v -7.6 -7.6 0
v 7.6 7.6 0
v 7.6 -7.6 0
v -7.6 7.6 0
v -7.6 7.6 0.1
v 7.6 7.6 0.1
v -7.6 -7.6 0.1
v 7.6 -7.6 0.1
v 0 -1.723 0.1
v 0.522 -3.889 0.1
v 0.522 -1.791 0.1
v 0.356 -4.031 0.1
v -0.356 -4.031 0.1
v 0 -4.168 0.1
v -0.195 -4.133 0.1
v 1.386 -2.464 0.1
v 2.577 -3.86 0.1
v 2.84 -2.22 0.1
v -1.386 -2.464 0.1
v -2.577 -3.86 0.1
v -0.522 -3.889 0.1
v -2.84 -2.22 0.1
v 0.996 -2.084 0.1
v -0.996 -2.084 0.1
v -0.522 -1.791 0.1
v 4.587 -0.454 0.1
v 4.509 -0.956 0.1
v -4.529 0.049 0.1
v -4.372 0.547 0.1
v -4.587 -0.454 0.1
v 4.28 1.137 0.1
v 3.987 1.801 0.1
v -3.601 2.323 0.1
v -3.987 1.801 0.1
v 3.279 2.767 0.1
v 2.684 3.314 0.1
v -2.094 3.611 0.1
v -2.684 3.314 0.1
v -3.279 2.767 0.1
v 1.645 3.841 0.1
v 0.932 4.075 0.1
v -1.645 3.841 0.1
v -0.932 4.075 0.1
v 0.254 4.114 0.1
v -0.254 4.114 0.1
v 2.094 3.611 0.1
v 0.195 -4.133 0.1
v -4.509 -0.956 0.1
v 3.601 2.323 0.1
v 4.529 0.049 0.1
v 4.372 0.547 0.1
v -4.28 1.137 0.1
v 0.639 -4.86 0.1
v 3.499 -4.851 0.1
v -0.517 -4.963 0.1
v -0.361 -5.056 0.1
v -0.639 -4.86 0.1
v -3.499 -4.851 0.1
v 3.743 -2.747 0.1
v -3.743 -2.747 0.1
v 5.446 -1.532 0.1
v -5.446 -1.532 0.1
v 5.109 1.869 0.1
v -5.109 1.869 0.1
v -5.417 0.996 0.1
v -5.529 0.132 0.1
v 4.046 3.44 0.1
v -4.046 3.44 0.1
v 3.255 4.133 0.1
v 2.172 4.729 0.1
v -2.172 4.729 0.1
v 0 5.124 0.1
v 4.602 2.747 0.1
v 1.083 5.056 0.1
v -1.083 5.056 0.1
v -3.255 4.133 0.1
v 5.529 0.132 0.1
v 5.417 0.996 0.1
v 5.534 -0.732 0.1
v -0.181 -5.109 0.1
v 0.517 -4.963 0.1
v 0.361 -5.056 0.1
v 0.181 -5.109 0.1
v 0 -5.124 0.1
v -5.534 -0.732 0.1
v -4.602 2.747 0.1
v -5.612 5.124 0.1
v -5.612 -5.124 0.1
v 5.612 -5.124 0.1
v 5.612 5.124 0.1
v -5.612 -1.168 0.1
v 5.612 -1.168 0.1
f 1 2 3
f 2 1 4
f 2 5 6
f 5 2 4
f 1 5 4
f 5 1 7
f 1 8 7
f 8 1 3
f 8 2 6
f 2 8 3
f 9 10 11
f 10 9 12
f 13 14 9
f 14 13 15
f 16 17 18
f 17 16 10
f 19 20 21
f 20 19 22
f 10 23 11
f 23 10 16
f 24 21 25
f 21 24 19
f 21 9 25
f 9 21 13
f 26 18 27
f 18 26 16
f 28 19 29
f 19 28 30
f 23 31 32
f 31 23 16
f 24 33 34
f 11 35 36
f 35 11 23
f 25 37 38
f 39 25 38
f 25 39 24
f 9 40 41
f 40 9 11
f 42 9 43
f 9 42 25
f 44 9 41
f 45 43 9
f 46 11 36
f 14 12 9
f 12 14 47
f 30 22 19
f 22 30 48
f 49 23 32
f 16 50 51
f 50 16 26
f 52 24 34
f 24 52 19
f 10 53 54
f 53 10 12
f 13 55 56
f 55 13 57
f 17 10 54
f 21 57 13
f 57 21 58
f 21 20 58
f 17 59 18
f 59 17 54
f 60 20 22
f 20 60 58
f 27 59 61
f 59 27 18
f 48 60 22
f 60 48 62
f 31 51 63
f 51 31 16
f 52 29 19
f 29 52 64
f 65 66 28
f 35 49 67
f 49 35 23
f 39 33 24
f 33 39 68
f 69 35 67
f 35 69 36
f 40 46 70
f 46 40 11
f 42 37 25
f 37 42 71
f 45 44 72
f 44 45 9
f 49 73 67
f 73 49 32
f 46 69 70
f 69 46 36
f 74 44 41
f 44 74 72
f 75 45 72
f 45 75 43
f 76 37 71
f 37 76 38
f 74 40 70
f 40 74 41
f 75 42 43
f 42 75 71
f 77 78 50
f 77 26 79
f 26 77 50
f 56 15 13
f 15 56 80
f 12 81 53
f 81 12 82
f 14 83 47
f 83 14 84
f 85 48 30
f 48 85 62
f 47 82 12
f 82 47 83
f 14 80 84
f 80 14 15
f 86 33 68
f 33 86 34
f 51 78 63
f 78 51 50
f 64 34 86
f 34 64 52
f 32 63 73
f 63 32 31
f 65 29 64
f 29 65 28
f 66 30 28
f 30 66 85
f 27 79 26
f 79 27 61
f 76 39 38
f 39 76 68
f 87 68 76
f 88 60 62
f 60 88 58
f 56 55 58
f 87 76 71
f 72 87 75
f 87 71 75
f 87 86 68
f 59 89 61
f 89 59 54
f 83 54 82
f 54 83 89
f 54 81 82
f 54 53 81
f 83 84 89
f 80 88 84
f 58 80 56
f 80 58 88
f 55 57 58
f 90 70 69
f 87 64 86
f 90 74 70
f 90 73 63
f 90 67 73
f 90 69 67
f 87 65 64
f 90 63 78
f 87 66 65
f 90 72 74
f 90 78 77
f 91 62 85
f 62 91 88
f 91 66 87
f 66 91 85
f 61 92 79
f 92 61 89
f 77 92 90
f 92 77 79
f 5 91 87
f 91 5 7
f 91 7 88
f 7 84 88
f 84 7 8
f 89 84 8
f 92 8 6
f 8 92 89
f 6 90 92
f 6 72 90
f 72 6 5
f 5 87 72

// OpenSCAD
// file: ../p/logo-shell-1971-outerbox.scad
use <../lib.scad>
function ldraw_lib__logo_shell_1971_outerbox() = [
// 0 Logo Shell 1971 Outerbox
// 0 Name: logo-shell-1971-outerbox.dat
// 0 Author: Vincent Messenet [Cheenzo]
// 0 !LDRAW_ORG Primitive UPDATE 2023-04
// 0 !LICENSE Licensed under CC BY 4.0 : see CAreadme.txt
// 
// 0 BFC CERTIFY CCW
  [0,"BFC","CERTIFY"],
  [0,"BFC","CCW"],
// 
// 0 !HISTORY 2023-06-28 [Cheenzo] Created based on 3004s60 by J. C. Tchang [tchang]
// 0 !HISTORY 2023-08-25 [OrionP] Official Update 2023-04
// 
// 
// 0 // Shell Logo 1971
// 0 // Size: x = -11.5 to 11.5 y = -10.5 to 10.5 z = 0
// 
// 3 16 -11.5 0 10.5 -8.29 0 7.05 -6.67 0 8.47
  [3,16,-11.5,0,10.5,-8.29,0,7.05,-6.67,0,8.47],
// 4 16 -7.17 0 -9.94 -7.67 0 -5.63 -11.16 0 -3.14 -11.5 0 -10.5
  [4,16,-7.17,0,-9.94,-7.67,0,-5.63,-11.16,0,-3.14,-11.5,0,-10.5],
// 3 16 -.74 0 -10.36 -1.06 0 -10.17 -7.17 0 -9.94
  [3,16,-.74,0,-10.36,-1.06,0,-10.17,-7.17,0,-9.94],
// 3 16 -11.5 0 10.5 -6.67 0 8.47 -4.45 0 9.69
  [3,16,-11.5,0,10.5,-6.67,0,8.47,-4.45,0,9.69],
// 3 16 0 0 10.5 -11.5 0 10.5 -2.22 0 10.36
  [3,16,0,0,10.5,-11.5,0,10.5,-2.22,0,10.36],
// 3 16 -11.5 0 10.5 -4.45 0 9.69 -2.22 0 10.36
  [3,16,-11.5,0,10.5,-4.45,0,9.69,-2.22,0,10.36],
// 3 16 -11.5 0 10.5 -9.43 0 5.63 -8.29 0 7.05
  [3,16,-11.5,0,10.5,-9.43,0,5.63,-8.29,0,7.05],
// 4 16 11.16 0 -3.14 7.67 0 -5.63 7.17 0 -9.94 11.5 0 -10.5
  [4,16,11.16,0,-3.14,7.67,0,-5.63,7.17,0,-9.94,11.5,0,-10.5],
// 4 16 11.5 0 -10.5 7.17 0 -9.94 .74 0 -10.36 .37 0 -10.47
  [4,16,11.5,0,-10.5,7.17,0,-9.94,.74,0,-10.36,.37,0,-10.47],
// 3 16 7.17 0 -9.94 1.06 0 -10.17 .74 0 -10.36
  [3,16,7.17,0,-9.94,1.06,0,-10.17,.74,0,-10.36],
// 3 16 7.17 0 -9.94 1.31 0 -9.96 1.06 0 -10.17
  [3,16,7.17,0,-9.94,1.31,0,-9.96,1.06,0,-10.17],
// 3 16 .37 0 -10.47 0 0 -10.5 11.5 0 -10.5
  [3,16,.37,0,-10.47,0,0,-10.5,11.5,0,-10.5],
// 3 16 -.37 0 -10.47 -11.5 0 -10.5 0 0 -10.5
  [3,16,-.37,0,-10.47,-11.5,0,-10.5,0,0,-10.5],
// 4 16 -.37 0 -10.47 -.74 0 -10.36 -7.17 0 -9.94 -11.5 0 -10.5
  [4,16,-.37,0,-10.47,-.74,0,-10.36,-7.17,0,-9.94,-11.5,0,-10.5],
// 3 16 -1.06 0 -10.17 -1.31 0 -9.96 -7.17 0 -9.94
  [3,16,-1.06,0,-10.17,-1.31,0,-9.96,-7.17,0,-9.94],
// 3 16 11.5 0 10.5 4.45 0 9.69 6.67 0 8.47
  [3,16,11.5,0,10.5,4.45,0,9.69,6.67,0,8.47],
// 3 16 -11.5 0 10.5 -10.47 0 3.83 -9.43 0 5.63
  [3,16,-11.5,0,10.5,-10.47,0,3.83,-9.43,0,5.63],
// 3 16 11.5 0 10.5 2.22 0 10.36 4.45 0 9.69
  [3,16,11.5,0,10.5,2.22,0,10.36,4.45,0,9.69],
// 3 16 11.5 0 10.5 9.43 0 5.63 10.47 0 3.83
  [3,16,11.5,0,10.5,9.43,0,5.63,10.47,0,3.83],
// 3 16 11.5 0 10.5 8.29 0 7.05 9.43 0 5.63
  [3,16,11.5,0,10.5,8.29,0,7.05,9.43,0,5.63],
// 3 16 11.5 0 10.5 6.67 0 8.47 8.29 0 7.05
  [3,16,11.5,0,10.5,6.67,0,8.47,8.29,0,7.05],
// 3 16 -11.5 0 10.5 -11.1 0 2.04 -10.47 0 3.83
  [3,16,-11.5,0,10.5,-11.1,0,2.04,-10.47,0,3.83],
// 3 16 11.5 0 10.5 10.47 0 3.83 11.1 0 2.04
  [3,16,11.5,0,10.5,10.47,0,3.83,11.1,0,2.04],
// 3 16 -11.5 0 10.5 -11.33 0 .27 -11.1 0 2.04
  [3,16,-11.5,0,10.5,-11.33,0,.27,-11.1,0,2.04],
// 3 16 11.5 0 10.5 0 0 10.5 2.22 0 10.36
  [3,16,11.5,0,10.5,0,0,10.5,2.22,0,10.36],
// 3 16 11.5 0 10.5 11.1 0 2.04 11.33 0 .27
  [3,16,11.5,0,10.5,11.1,0,2.04,11.33,0,.27],
// 4 16 -11.16 0 -3.14 -11.34 0 -1.5 -11.5 0 -2.39 -11.5 0 -10.5
  [4,16,-11.16,0,-3.14,-11.34,0,-1.5,-11.5,0,-2.39,-11.5,0,-10.5],
// 4 16 -11.34 0 -1.5 -11.33 0 .27 -11.5 0 10.5 -11.5 0 -2.39
  [4,16,-11.34,0,-1.5,-11.33,0,.27,-11.5,0,10.5,-11.5,0,-2.39],
// 4 16 11.5 0 -2.39 11.34 0 -1.5 11.16 0 -3.14 11.5 0 -10.5
  [4,16,11.5,0,-2.39,11.34,0,-1.5,11.16,0,-3.14,11.5,0,-10.5],
// 4 16 11.5 0 -2.39 11.5 0 10.5 11.33 0 .27 11.34 0 -1.5
  [4,16,11.5,0,-2.39,11.5,0,10.5,11.33,0,.27,11.34,0,-1.5],
];
module ldraw_lib__logo_shell_1971_outerbox(step=0, col=false, unit=2/5, alt=false, line=0.2, solid=!$preview)
    makepoly(ldraw_lib__logo_shell_1971_outerbox(), step=step, col=col, unit=unit, alt=alt, line=line, solid=solid);
ldraw_lib__logo_shell_1971_outerbox(line=0.2);
// file: ../p/box5-12.scad
use <../lib.scad>
function ldraw_lib__box5_12() = [
// 0 Box with 5 Faces without Any Edges
// 0 Name: box5-12.dat
// 0 Author: Chris Dee [cwdee]
// 0 !LDRAW_ORG Primitive UPDATE 2009-02
// 0 !LICENSE Licensed under CC BY 4.0 : see CAreadme.txt
// 
// 0 BFC CERTIFY CCW
  [0,"BFC","CERTIFY"],
  [0,"BFC","CCW"],
// 
// 0 !HISTORY 2009-09-03 [PTadmin] Official Update 2009-02
// 
// 
// 4 16 1 1 1 1 1 -1 -1 1 -1 -1 1 1
  [4,16,1,1,1,1,1,-1,-1,1,-1,-1,1,1],
// 4 16 -1 0 1 1 0 1 1 1 1 -1 1 1
  [4,16,-1,0,1,1,0,1,1,1,1,-1,1,1],
// 4 16 -1 0 -1 -1 0 1 -1 1 1 -1 1 -1
  [4,16,-1,0,-1,-1,0,1,-1,1,1,-1,1,-1],
// 4 16 1 0 -1 -1 0 -1 -1 1 -1 1 1 -1
  [4,16,1,0,-1,-1,0,-1,-1,1,-1,1,1,-1],
// 4 16 1 0 1 1 0 -1 1 1 -1 1 1 1
  [4,16,1,0,1,1,0,-1,1,1,-1,1,1,1],
// 0
];
module ldraw_lib__box5_12(step=0, col=false, unit=2/5, alt=false, line=0.2, solid=!$preview)
    makepoly(ldraw_lib__box5_12(), step=step, col=col, unit=unit, alt=alt, line=line, solid=solid);
ldraw_lib__box5_12(line=0.2);
// file: 004695b.scad
use <../lib.scad>
use <../p/box5-12.scad>
use <../p/logo-shell-1971-outerbox.scad>
use <../p/logo-shell-1971.scad>
function ldraw_lib__004695b() = [
// 0 Sticker  1.9 x  1.9 with Shell Logo 1971
// 0 Name: 004695b.dat
// 0 Author: J.C. Tchang [tchang]
// 0 !LDRAW_ORG Part UPDATE 2023-04
// 0 !LICENSE Licensed under CC BY 4.0 : see CAreadme.txt
// 
// 0 BFC CERTIFY CCW
  [0,"BFC","CERTIFY"],
  [0,"BFC","CCW"],
// 
// 0 !KEYWORDS Bricklink 377.1stk01, Brickowl 327282, Rebrickable 4695, Set 377
// 
// 0 !HISTORY 2014-06-21 [PTadmin] Official Update 2014-01
// 0 !HISTORY 2023-06-30 [Cheenzo] Made use of logo prims, added keyword, updated description
// 0 !HISTORY 2023-08-25 [OrionP] Official Update 2023-04
// 
// 
// 1 16 0 -0.25 0 19 0 0 0 0.25 0 0 0 19 box5-12.dat
  [1,16,0,-0.25,0,19,0,0,0,0.25,0,0,0,19, ldraw_lib__box5_12()],
// 1 16 0 -.25 0 1.22 0 0 0 1 0 0 0 1.22 logo-shell-1971.dat
  [1,16,0,-.25,0,1.22,0,0,0,1,0,0,0,1.22, ldraw_lib__logo_shell_1971()],
// 1 15 0 -.25 0 1.22 0 0 0 1 0 0 0 1.22 logo-shell-1971-outerbox.dat
  [1,15,0,-.25,0,1.22,0,0,0,1,0,0,0,1.22, ldraw_lib__logo_shell_1971_outerbox()],
// 4 15 -14.03 -.25 -2.9158 -14.03 -.25 12.81 -19 -.25 19 -19 -.25 -19
  [4,15,-14.03,-.25,-2.9158,-14.03,-.25,12.81,-19,-.25,19,-19,-.25,-19],
// 3 15 -14.03 -.25 -2.9158 -19 -.25 -19 -14.03 -.25 -12.81
  [3,15,-14.03,-.25,-2.9158,-19,-.25,-19,-14.03,-.25,-12.81],
// 4 15 0 -0.25 -12.81 -14.03 -0.25 -12.81 -19 -0.25 -19 19 -0.25 -19
  [4,15,0,-0.25,-12.81,-14.03,-0.25,-12.81,-19,-0.25,-19,19,-0.25,-19],
// 3 15 14.03 -0.25 -12.81 0 -0.25 -12.81 19 -0.25 -19
  [3,15,14.03,-0.25,-12.81,0,-0.25,-12.81,19,-0.25,-19],
// 4 15 14.03 -.25 -2.9158 14.03 -.25 -12.81 19 -.25 -19 19 -.25 19
  [4,15,14.03,-.25,-2.9158,14.03,-.25,-12.81,19,-.25,-19,19,-.25,19],
// 3 15 19 -.25 19 14.03 -.25 12.81 14.03 -.25 -2.9158
  [3,15,19,-.25,19,14.03,-.25,12.81,14.03,-.25,-2.9158],
// 4 15 0 -0.25 12.81 14.03 -0.25 12.81 19 -0.25 19 -19 -0.25 19
  [4,15,0,-0.25,12.81,14.03,-0.25,12.81,19,-0.25,19,-19,-0.25,19],
// 3 15 -19 -0.25 19 -14.03 -0.25 12.81 0 -0.25 12.81
  [3,15,-19,-0.25,19,-14.03,-0.25,12.81,0,-0.25,12.81],
];
module ldraw_lib__004695b(step=0, col=false, unit=2/5, alt=false, line=0.2, solid=!$preview)
    makepoly(ldraw_lib__004695b(), step=step, col=col, unit=unit, alt=alt, line=line, solid=solid);
ldraw_lib__004695b(line=0.2);
// main file
use <../lib.scad>
use <004695b.scad>
function ldraw_lib__195555g() = [
// 0 =Sticker 1.9 x 1.9 with Shell Logo
// 0 Name: 195555g.dat
// 0 Author: Takeshi Takahashi [RainbowDolphin]
// 0 !LDRAW_ORG Part Alias UPDATE 2023-06
// 0 !LICENSE Licensed under CC BY 4.0 : see CAreadme.txt
// 
// 0 BFC CERTIFY CCW
  [0,"BFC","CERTIFY"],
  [0,"BFC","CCW"],
// 
// 0 !KEYWORDS Bricklink 6371stk01, Brickowl 584391, Rebrickable 195555
// 0 !KEYWORDS Service station, Set 6371
// 
// 0 !HISTORY 2023-11-19 [OrionP] Official Update 2023-06
// 
// 
// 0 // Alias of 004695b
// 
// 1 16 0 0 0 1 0 0 0 1 0 0 0 1 004695b.dat
  [1,16,0,0,0,1,0,0,0,1,0,0,0,1, ldraw_lib__004695b()],
];
module ldraw_lib__195555g(step=0, col=false, unit=2/5, alt=false, line=0.2, solid=!$preview)
    makepoly(ldraw_lib__195555g(), step=step, col=col, unit=unit, alt=alt, line=line, solid=solid);
ldraw_lib__195555g(line=0.2);
